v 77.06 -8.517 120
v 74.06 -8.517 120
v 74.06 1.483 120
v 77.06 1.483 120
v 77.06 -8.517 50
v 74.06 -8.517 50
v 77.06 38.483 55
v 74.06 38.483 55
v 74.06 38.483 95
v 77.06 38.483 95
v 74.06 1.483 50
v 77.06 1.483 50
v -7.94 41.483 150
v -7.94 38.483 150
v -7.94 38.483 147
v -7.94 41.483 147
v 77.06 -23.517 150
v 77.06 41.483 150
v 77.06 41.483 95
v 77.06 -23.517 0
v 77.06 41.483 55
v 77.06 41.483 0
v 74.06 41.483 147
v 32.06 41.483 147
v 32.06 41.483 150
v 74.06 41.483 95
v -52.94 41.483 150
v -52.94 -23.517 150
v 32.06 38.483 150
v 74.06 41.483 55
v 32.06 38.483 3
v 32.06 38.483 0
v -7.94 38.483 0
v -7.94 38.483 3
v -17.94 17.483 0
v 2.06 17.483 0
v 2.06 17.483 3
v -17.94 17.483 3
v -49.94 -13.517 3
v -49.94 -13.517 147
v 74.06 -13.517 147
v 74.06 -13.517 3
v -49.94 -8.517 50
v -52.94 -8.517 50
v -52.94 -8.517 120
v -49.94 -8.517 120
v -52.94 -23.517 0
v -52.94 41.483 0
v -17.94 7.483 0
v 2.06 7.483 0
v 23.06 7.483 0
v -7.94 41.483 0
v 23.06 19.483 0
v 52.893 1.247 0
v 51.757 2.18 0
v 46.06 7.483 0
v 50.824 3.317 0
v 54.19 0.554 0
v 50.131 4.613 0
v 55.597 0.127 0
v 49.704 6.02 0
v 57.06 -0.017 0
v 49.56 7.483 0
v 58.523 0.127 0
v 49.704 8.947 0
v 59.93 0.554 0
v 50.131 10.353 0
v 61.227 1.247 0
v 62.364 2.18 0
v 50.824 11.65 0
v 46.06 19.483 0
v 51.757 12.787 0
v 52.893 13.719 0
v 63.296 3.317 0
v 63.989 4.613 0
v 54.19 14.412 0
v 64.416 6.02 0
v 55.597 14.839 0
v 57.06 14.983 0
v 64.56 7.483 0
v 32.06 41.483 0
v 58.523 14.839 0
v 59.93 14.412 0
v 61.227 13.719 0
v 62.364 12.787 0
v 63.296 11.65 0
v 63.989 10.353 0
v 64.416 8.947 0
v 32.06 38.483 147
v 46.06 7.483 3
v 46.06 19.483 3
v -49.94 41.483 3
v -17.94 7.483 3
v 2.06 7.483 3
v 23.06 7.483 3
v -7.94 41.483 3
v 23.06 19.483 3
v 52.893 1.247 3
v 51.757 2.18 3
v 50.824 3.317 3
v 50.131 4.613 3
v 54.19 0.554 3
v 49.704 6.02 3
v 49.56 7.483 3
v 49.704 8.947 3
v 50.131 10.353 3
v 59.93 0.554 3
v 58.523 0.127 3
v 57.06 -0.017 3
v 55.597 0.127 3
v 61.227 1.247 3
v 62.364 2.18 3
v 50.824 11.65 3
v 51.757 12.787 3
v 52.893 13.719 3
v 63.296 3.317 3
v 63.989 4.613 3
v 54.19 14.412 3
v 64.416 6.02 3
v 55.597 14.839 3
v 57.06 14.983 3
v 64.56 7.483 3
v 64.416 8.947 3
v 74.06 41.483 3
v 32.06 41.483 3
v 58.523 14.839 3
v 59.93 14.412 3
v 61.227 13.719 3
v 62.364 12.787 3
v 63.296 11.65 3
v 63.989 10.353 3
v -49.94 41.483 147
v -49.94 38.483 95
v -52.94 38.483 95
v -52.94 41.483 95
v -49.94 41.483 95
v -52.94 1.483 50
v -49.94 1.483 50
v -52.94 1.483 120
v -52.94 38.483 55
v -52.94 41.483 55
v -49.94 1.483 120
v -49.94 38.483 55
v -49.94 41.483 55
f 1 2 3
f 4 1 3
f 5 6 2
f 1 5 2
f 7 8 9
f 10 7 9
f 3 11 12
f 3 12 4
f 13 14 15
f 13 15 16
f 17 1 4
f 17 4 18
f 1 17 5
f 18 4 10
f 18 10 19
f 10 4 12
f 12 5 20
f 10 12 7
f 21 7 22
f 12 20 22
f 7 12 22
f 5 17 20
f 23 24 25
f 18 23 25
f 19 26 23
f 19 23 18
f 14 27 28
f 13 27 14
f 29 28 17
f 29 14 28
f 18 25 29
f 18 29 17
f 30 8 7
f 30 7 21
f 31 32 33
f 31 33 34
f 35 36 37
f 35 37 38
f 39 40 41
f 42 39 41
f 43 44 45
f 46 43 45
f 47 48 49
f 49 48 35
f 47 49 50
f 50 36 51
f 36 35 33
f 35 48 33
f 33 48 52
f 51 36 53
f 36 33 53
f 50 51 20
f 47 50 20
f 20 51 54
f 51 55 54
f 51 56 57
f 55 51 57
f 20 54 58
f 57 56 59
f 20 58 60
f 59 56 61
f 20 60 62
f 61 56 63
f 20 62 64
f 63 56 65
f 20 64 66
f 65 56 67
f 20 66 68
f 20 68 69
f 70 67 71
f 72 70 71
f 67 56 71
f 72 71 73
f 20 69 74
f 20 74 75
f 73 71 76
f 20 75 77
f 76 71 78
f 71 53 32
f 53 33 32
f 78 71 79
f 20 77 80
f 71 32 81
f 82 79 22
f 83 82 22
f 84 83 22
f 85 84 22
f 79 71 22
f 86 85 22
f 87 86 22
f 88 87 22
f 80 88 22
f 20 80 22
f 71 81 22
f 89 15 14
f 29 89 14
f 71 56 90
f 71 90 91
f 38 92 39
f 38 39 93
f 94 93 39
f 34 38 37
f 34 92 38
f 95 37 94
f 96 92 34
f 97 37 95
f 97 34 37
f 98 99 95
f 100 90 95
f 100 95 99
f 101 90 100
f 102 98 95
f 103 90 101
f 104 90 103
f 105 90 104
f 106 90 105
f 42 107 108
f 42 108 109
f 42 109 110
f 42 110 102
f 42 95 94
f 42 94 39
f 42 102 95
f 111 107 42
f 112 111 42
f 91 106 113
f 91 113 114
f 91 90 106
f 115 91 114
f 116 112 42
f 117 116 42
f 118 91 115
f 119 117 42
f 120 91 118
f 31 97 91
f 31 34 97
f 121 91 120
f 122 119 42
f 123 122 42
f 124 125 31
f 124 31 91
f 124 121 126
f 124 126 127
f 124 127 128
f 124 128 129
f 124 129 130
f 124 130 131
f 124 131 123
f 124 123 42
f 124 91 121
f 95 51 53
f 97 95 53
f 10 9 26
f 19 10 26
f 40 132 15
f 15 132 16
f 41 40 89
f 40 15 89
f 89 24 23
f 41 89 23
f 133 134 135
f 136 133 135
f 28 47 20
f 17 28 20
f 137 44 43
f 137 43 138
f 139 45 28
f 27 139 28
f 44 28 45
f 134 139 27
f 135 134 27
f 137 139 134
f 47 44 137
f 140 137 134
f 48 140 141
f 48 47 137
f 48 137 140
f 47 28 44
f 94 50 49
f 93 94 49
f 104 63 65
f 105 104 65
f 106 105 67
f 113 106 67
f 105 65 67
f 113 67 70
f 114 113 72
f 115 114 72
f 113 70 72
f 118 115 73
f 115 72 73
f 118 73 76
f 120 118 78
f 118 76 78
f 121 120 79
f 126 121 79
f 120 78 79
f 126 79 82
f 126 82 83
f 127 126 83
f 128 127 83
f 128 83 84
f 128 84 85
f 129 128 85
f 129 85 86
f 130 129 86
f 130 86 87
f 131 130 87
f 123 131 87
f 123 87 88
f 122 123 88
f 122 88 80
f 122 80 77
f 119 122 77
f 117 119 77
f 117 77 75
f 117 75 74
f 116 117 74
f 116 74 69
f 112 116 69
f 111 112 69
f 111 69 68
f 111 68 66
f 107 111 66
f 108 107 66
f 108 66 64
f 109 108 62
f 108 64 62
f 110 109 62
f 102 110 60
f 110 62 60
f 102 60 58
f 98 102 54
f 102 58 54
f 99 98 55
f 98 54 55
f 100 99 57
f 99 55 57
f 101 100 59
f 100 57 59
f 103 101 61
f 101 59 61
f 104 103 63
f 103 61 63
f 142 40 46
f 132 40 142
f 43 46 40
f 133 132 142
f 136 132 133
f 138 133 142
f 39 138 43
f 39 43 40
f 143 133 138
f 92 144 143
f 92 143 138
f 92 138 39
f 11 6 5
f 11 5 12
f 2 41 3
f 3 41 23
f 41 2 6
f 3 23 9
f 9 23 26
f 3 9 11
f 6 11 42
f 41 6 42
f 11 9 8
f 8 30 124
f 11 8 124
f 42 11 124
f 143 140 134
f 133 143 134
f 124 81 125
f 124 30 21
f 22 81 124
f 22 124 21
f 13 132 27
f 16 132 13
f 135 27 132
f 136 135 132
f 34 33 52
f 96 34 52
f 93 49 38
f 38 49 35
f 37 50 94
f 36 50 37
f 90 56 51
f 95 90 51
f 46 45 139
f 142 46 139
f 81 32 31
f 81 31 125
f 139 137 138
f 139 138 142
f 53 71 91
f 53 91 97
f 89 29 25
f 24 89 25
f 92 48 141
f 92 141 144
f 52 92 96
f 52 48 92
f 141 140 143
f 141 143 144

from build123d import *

# Parameters (mm, degrees)
ESBO_O1_W                = 130
ESBO_O1_H                = 65
RESSALTO_EXTRUS_O1_DEPTH = 150
ESBO_O2_W                = 70
ESBO_O2_H                = 10
CORTE_EXTRUS_O1_DEPTH    = 131
ESBO_O3_W                = 40
ESBO_O3_H                = 3
CORTE_EXTRUS_O2_DEPTH    = 131
ESBO_O4_W                = 40
ESBO_O4_H                = 3
CORTE_EXTRUS_O3_DEPTH    = 151
ESBO_O5_R                = 7.5
ESBO_O5_W                = 20
ESBO_O5_H                = 10
CORTE_EXTRUS_O4_DEPTH    = 141
ESBO_O6_W                = 124
ESBO_O6_H                = 144
CORTE_EXTRUS_O5_DEPTH    = 55
ESBO_O9_W                = 23
ESBO_O9_H                = 12
CORTE_EXTRUS_O6_DEPTH    = 3


with BuildPart() as part:
    # Esboço1 → Ressalto-extrusão1 (new body)
    with BuildSketch(Plane.XY):
        with Locations((12.060242954, 8.983357453)):
            Rectangle(ESBO_O1_W, ESBO_O1_H)
    extrude(amount=RESSALTO_EXTRUS_O1_DEPTH)

    # Esboço2 → Corte-extrusão1 (cut, through all)
    with BuildSketch(Plane.ZY.offset(52.939757046)):
        with Locations((85, -3.516642547)):
            Rectangle(ESBO_O2_W, ESBO_O2_H)
    extrude(amount=-CORTE_EXTRUS_O1_DEPTH, mode=Mode.SUBTRACT)

    # Esboço3 → Corte-extrusão2 (cut, through all)
    with BuildSketch(Plane.ZY.offset(52.939757046)):
        with Locations((75, 39.983357453)):
            Rectangle(ESBO_O3_W, ESBO_O3_H)
    extrude(amount=-CORTE_EXTRUS_O2_DEPTH, mode=Mode.SUBTRACT)

    # Esboço4 → Corte-extrusão3 (cut, through all)
    with BuildSketch(Plane(origin=(0, 0, 0), x_dir=(-1, 0, 0), z_dir=(0, 0, -1))):
        with Locations((-12.060242954, 39.983357453)):
            Rectangle(ESBO_O4_W, ESBO_O4_H)
    extrude(amount=-CORTE_EXTRUS_O3_DEPTH, mode=Mode.SUBTRACT)

    # Esboço5 → Corte-extrusão4 (cut)
    with BuildSketch(Plane(origin=(0, 0, 0), x_dir=(-1, 0, 0), z_dir=(0, 0, -1))):
        with Locations((-57.060242954, 7.483357453)):
            Circle(ESBO_O5_R)
        with Locations((7.939757046, 12.483357453)):
            Rectangle(ESBO_O5_W, ESBO_O5_H)
    extrude(amount=-CORTE_EXTRUS_O4_DEPTH, mode=Mode.SUBTRACT)

    # Esboço6 → Corte-extrusão5 (cut)
    with BuildSketch(Plane(origin=(0, 41.483357453, 0), x_dir=(1, 0, 0), z_dir=(0, 1, 0))):
        with Locations((12.060242954, -75)):
            Rectangle(ESBO_O6_W, ESBO_O6_H)
    extrude(amount=-CORTE_EXTRUS_O5_DEPTH, mode=Mode.SUBTRACT)

    # Esboço9 → Corte-extrusão6 (cut)
    with BuildSketch(Plane(origin=(0, 0, 0), x_dir=(-1, 0, 0), z_dir=(0, 0, -1))):
        with Locations((-34.560242954, 13.483357453)):
            Rectangle(ESBO_O9_W, ESBO_O9_H)
    extrude(amount=-CORTE_EXTRUS_O6_DEPTH, mode=Mode.SUBTRACT)


solid = part.part
